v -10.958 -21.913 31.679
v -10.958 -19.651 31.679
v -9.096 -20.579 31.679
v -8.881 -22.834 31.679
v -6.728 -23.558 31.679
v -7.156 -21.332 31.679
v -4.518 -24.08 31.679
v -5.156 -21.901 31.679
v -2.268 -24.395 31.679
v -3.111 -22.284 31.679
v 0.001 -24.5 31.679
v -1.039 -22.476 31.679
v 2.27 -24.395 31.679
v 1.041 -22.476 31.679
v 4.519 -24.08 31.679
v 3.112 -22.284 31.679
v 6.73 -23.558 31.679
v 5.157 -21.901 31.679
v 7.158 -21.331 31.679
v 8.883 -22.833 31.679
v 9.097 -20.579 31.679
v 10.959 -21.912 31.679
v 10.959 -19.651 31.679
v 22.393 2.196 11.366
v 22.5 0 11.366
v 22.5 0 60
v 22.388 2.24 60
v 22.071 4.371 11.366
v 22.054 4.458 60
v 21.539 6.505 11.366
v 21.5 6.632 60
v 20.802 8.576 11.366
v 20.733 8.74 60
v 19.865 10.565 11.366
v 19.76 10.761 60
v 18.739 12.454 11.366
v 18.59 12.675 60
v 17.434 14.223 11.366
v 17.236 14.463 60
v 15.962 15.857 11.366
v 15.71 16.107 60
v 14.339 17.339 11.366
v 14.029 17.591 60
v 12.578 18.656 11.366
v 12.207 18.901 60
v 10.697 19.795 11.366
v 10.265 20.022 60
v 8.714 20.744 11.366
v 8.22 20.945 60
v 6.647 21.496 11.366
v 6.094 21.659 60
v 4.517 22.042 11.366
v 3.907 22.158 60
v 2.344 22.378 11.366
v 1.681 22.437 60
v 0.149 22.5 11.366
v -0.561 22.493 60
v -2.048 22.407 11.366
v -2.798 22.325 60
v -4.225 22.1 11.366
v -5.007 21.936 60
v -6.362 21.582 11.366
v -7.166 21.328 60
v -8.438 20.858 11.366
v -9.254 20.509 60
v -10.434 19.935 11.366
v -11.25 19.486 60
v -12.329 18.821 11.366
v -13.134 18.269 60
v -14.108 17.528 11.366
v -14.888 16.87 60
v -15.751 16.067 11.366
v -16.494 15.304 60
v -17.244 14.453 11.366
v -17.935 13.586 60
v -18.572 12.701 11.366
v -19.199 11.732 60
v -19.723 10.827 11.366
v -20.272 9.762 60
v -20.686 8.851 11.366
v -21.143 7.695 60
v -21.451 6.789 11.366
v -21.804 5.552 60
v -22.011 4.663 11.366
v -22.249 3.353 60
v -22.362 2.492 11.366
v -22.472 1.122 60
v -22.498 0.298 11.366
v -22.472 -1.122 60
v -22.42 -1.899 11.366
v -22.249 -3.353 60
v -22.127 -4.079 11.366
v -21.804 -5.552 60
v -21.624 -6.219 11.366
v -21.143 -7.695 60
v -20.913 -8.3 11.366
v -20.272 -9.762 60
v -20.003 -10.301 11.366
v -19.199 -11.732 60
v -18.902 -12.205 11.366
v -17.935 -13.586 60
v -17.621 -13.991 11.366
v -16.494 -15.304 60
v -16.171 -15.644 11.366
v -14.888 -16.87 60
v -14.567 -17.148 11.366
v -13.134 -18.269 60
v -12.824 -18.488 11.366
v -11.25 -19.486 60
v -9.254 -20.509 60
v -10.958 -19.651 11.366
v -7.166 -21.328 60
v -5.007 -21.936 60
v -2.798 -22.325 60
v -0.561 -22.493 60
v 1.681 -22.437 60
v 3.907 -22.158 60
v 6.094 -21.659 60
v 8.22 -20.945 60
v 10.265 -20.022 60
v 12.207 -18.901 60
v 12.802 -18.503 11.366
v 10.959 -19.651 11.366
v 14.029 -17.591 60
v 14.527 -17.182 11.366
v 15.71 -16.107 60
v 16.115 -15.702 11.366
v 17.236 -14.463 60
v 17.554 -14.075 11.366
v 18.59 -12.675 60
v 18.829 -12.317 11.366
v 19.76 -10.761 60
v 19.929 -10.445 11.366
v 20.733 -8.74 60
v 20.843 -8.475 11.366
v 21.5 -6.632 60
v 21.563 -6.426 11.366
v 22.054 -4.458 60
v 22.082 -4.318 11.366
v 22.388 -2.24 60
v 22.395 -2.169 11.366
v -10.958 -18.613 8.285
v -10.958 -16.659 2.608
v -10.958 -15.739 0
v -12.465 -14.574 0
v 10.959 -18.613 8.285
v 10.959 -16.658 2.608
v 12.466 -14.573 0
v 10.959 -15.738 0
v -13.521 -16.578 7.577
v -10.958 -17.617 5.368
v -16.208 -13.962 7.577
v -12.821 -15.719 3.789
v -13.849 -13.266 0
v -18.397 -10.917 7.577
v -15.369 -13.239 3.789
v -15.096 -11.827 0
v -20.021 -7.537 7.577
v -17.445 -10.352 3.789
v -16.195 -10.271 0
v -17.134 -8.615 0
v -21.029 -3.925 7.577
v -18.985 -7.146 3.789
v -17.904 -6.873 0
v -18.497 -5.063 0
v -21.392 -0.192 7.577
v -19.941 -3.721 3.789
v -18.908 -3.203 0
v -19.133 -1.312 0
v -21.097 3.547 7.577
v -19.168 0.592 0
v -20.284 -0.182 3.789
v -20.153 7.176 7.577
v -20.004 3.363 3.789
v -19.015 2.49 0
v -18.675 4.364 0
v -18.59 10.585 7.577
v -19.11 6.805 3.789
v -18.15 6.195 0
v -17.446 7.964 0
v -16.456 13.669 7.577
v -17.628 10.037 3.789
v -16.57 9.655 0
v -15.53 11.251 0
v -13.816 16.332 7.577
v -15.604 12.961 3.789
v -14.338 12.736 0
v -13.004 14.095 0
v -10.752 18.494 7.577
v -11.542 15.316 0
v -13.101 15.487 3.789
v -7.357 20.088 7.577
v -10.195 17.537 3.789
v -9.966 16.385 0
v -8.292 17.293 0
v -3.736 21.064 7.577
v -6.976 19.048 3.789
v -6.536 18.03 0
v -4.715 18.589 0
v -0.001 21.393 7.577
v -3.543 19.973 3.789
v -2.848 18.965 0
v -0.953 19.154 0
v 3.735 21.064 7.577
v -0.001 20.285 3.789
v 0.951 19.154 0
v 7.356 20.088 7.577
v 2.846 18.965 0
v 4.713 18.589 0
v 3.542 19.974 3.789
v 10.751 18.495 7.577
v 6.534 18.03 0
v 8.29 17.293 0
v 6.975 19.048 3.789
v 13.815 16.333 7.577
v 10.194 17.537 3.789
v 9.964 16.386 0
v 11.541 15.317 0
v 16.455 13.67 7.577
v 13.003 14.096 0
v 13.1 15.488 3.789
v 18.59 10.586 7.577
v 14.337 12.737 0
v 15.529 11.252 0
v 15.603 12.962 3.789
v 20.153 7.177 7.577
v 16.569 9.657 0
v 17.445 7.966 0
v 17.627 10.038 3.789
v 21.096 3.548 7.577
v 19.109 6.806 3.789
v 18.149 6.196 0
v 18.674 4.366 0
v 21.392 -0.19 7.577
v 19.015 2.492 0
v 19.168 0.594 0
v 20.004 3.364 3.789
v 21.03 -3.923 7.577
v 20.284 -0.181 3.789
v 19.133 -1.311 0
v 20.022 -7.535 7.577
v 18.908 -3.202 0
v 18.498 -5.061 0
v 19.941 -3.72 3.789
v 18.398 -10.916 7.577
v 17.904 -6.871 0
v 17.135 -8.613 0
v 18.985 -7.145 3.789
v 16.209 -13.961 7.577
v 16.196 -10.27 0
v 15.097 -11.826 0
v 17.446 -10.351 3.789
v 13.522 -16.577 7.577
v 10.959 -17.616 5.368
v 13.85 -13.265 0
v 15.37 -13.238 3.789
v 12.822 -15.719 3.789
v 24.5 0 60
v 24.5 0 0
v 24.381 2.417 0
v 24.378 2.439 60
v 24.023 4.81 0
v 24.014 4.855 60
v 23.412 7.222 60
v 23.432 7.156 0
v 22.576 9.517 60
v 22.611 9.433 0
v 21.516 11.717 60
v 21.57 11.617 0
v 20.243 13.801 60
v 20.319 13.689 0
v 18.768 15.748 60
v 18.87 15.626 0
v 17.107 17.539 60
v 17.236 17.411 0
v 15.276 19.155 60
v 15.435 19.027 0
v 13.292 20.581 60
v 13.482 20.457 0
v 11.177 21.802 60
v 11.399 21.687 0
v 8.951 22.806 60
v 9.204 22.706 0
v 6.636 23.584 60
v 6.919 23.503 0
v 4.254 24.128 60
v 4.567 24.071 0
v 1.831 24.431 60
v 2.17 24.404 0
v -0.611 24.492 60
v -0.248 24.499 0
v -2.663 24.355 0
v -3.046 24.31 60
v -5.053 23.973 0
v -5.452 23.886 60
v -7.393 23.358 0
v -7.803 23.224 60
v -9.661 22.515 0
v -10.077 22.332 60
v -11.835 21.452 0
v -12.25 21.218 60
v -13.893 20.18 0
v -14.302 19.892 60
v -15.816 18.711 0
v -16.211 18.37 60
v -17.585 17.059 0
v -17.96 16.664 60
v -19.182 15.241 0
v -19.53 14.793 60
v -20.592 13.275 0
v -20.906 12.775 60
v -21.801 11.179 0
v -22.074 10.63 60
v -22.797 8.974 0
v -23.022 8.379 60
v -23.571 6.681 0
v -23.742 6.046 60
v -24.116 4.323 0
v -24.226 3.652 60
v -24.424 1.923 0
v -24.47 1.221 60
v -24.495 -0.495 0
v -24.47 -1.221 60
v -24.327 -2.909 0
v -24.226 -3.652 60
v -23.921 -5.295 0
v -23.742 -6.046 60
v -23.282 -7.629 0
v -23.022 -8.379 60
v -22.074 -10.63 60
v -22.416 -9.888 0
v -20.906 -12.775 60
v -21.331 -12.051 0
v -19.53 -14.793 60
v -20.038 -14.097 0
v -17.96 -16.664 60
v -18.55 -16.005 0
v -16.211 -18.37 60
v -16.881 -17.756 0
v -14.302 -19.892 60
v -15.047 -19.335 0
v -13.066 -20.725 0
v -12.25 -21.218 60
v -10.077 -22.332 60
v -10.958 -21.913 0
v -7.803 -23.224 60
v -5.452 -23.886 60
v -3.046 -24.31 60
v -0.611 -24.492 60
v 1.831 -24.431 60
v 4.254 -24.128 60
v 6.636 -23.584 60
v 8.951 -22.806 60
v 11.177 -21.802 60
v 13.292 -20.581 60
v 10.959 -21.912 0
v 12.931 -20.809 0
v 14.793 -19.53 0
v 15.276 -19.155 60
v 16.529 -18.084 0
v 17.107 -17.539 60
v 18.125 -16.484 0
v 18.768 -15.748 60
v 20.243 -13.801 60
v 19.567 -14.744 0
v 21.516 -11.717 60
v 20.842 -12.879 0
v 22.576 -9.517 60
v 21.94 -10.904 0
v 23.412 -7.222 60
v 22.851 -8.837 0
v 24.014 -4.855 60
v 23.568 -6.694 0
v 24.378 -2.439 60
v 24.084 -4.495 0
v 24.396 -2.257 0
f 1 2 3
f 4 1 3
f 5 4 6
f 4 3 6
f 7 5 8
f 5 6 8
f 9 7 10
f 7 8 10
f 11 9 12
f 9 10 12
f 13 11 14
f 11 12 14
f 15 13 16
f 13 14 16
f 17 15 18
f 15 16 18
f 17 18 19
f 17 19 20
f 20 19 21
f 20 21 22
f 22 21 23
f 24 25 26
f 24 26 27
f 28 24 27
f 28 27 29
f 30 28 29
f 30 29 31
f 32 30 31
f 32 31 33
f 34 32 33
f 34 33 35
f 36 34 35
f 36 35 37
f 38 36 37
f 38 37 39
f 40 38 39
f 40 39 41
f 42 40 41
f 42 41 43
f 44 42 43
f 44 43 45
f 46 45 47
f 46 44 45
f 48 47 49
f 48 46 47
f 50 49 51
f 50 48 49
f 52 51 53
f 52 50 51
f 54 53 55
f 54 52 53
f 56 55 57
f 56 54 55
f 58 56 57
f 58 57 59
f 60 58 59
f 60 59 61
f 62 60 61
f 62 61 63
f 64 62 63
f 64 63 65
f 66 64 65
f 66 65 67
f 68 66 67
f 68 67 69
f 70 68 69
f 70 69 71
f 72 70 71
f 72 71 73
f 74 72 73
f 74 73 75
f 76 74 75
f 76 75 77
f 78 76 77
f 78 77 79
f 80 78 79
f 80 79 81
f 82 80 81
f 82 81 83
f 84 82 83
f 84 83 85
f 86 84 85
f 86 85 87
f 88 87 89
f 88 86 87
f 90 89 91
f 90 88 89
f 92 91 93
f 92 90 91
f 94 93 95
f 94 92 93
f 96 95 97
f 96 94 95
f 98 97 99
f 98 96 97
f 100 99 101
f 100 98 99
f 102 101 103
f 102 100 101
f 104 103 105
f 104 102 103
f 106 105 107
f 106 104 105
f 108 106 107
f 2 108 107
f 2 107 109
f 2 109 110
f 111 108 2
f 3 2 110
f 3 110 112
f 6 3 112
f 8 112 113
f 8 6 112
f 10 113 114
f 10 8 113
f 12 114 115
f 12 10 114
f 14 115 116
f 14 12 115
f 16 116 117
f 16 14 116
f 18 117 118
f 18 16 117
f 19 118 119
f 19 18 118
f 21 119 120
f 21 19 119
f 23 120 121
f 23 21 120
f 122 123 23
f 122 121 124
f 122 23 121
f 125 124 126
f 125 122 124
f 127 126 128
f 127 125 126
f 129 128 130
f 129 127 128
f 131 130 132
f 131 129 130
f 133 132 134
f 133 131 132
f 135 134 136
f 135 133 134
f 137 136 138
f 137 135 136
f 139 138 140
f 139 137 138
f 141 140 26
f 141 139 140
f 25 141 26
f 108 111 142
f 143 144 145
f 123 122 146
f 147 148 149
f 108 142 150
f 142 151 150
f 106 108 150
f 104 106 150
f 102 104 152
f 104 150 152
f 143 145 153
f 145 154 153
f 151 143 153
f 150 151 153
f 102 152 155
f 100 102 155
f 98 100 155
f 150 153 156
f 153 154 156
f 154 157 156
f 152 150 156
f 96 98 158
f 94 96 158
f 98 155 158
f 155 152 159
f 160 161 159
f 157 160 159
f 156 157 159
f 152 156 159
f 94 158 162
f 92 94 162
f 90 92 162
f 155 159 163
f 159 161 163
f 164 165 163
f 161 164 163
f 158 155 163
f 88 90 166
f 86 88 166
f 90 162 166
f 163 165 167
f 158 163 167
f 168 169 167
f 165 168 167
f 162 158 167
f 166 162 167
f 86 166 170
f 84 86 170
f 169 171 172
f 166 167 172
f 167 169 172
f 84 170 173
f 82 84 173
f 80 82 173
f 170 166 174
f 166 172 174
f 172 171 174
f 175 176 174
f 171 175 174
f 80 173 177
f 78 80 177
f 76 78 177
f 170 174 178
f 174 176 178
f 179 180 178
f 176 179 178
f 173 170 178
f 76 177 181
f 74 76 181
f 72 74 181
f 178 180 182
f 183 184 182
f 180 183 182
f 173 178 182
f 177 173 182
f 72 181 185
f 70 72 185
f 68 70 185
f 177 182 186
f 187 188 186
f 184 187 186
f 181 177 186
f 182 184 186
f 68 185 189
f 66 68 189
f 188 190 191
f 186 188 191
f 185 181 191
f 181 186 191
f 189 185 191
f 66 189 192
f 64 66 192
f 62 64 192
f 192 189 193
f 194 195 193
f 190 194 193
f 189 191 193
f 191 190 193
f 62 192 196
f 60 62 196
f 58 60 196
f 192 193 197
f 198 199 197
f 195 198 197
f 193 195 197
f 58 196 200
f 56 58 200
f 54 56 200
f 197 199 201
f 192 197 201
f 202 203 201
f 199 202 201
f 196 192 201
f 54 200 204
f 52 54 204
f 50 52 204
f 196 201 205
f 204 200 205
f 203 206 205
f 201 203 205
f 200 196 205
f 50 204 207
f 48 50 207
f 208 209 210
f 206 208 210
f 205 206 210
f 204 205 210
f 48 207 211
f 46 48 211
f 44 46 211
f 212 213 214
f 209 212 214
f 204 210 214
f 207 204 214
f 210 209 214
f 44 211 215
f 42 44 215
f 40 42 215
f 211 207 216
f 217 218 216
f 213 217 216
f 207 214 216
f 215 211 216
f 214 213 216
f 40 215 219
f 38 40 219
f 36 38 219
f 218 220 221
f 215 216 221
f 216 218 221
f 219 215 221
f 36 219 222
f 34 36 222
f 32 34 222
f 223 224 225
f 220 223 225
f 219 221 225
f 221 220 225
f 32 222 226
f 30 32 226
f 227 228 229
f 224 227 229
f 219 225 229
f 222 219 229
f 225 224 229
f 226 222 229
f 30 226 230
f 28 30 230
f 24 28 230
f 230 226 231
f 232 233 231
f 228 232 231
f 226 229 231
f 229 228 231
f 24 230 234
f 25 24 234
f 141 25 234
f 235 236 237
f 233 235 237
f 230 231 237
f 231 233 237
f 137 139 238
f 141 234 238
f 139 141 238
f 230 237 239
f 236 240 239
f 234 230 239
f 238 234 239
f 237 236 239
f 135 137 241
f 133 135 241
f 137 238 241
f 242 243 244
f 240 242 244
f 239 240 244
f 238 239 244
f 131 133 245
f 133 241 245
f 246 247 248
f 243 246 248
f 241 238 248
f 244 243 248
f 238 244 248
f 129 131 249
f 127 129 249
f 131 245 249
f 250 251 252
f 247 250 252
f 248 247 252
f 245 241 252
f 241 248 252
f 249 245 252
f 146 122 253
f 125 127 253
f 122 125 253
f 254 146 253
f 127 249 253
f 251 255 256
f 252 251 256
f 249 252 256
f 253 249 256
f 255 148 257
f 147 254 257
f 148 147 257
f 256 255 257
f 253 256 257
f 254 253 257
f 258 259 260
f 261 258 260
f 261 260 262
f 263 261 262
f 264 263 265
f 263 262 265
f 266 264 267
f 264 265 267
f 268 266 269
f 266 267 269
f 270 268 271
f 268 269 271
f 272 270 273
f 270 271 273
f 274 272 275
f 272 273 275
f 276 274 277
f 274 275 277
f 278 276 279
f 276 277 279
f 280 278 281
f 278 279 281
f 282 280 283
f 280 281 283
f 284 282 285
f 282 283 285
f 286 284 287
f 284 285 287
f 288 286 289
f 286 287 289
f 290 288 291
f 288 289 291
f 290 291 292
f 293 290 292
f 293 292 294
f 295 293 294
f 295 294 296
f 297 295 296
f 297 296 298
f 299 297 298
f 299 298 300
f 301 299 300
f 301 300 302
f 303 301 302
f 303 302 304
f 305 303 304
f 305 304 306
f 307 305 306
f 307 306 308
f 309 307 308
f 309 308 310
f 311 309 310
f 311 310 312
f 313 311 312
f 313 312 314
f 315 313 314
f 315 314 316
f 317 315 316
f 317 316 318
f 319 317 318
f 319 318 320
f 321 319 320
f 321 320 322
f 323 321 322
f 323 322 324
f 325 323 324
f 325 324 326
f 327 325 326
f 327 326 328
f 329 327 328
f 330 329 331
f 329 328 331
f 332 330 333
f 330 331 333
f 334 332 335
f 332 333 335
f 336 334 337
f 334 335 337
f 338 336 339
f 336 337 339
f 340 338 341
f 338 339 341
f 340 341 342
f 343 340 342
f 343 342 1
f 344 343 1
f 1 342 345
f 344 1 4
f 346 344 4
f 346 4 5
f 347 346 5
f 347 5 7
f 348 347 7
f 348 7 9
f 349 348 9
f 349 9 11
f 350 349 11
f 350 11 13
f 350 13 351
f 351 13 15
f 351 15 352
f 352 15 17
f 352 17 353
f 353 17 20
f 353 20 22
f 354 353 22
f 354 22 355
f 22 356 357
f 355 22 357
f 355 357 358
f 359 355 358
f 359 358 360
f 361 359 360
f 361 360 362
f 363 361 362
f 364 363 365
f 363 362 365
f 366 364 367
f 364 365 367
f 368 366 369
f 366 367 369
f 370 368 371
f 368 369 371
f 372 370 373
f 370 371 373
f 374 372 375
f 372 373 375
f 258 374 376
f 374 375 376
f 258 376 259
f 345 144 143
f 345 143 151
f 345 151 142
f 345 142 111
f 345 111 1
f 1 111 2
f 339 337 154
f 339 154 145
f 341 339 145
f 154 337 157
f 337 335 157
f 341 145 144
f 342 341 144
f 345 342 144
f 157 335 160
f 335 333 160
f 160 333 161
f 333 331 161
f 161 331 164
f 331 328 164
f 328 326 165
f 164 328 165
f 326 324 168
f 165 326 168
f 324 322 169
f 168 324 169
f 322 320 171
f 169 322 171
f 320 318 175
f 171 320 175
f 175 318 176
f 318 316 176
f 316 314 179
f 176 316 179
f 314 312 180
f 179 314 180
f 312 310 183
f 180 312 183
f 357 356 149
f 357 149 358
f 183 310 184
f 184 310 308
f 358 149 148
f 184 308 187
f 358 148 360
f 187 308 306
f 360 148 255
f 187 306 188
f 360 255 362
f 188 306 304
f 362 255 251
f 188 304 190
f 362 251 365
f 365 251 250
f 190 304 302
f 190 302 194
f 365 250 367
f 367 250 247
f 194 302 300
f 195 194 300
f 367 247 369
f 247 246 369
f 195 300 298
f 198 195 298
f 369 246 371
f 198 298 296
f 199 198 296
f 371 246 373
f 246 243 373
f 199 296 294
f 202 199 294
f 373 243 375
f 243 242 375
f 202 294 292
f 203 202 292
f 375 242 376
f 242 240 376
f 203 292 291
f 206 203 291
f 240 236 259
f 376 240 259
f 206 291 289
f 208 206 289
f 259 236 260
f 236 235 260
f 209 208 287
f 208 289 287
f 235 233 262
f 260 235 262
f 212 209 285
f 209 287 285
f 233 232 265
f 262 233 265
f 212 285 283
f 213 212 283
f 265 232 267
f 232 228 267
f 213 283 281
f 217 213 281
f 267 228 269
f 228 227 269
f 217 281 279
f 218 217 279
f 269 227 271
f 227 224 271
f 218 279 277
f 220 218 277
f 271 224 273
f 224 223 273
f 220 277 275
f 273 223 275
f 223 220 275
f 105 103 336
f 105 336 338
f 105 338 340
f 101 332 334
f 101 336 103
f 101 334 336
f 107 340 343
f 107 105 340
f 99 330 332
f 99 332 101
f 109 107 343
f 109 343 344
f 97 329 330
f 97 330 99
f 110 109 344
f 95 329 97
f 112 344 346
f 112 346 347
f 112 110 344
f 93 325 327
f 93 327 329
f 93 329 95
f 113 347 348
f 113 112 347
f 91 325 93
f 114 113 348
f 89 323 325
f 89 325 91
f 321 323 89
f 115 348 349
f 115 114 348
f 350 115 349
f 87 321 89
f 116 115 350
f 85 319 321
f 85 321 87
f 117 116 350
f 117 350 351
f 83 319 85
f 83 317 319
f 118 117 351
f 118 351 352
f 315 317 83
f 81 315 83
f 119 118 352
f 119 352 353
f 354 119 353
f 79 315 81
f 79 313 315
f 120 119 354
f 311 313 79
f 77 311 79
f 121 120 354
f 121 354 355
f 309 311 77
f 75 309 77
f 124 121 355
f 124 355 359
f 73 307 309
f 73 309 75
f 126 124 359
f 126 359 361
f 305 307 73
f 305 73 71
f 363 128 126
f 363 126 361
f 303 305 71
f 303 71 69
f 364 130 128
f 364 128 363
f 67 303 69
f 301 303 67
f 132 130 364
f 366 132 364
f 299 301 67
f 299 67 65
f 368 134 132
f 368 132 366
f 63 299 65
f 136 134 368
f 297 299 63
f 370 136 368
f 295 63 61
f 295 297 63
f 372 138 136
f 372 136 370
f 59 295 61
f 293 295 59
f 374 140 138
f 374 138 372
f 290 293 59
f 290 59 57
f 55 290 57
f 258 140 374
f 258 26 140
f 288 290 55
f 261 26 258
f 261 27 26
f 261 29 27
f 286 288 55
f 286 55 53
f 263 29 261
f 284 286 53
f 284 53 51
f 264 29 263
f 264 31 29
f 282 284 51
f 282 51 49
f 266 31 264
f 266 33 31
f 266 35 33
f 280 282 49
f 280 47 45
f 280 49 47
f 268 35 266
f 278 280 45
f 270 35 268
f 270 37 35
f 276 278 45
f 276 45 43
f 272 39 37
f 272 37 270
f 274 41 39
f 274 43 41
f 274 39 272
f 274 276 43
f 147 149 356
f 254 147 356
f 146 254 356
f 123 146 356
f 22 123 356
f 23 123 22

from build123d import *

# Parameters (mm, degrees)
F0_R     = 24.5
F0_R_2   = 22.5
F1_DEPTH = 60
F4_W     = 21.917041
F4_H     = 35.913566
F5_DEPTH = 25


with BuildPart() as f1:
    # F0 (on Top) → F1 (new body)
    with BuildSketch(Plane.XY):
        Circle(F0_R)
        Circle(F0_R_2, mode=Mode.SUBTRACT)
    extrude(amount=F1_DEPTH)

    # F2 (on Front) → F3 (revolve)
    with BuildSketch(Plane.XZ):
        Polygon((23.440696, 11.506858), (22.541139, 11.506858), (19.177632, 0), (23.440696, 0), align=None)
    revolve(axis=Axis((0, 0, 8.668173), (0, 0, -1)))

    # F4 (on Front) → F5 (cut)
    with BuildSketch(Plane.XZ):
        with Locations((0.000676, 13.722296)):
            Rectangle(F4_W, F4_H)
    extrude(amount=F5_DEPTH, mode=Mode.SUBTRACT)


solid = f1.part
